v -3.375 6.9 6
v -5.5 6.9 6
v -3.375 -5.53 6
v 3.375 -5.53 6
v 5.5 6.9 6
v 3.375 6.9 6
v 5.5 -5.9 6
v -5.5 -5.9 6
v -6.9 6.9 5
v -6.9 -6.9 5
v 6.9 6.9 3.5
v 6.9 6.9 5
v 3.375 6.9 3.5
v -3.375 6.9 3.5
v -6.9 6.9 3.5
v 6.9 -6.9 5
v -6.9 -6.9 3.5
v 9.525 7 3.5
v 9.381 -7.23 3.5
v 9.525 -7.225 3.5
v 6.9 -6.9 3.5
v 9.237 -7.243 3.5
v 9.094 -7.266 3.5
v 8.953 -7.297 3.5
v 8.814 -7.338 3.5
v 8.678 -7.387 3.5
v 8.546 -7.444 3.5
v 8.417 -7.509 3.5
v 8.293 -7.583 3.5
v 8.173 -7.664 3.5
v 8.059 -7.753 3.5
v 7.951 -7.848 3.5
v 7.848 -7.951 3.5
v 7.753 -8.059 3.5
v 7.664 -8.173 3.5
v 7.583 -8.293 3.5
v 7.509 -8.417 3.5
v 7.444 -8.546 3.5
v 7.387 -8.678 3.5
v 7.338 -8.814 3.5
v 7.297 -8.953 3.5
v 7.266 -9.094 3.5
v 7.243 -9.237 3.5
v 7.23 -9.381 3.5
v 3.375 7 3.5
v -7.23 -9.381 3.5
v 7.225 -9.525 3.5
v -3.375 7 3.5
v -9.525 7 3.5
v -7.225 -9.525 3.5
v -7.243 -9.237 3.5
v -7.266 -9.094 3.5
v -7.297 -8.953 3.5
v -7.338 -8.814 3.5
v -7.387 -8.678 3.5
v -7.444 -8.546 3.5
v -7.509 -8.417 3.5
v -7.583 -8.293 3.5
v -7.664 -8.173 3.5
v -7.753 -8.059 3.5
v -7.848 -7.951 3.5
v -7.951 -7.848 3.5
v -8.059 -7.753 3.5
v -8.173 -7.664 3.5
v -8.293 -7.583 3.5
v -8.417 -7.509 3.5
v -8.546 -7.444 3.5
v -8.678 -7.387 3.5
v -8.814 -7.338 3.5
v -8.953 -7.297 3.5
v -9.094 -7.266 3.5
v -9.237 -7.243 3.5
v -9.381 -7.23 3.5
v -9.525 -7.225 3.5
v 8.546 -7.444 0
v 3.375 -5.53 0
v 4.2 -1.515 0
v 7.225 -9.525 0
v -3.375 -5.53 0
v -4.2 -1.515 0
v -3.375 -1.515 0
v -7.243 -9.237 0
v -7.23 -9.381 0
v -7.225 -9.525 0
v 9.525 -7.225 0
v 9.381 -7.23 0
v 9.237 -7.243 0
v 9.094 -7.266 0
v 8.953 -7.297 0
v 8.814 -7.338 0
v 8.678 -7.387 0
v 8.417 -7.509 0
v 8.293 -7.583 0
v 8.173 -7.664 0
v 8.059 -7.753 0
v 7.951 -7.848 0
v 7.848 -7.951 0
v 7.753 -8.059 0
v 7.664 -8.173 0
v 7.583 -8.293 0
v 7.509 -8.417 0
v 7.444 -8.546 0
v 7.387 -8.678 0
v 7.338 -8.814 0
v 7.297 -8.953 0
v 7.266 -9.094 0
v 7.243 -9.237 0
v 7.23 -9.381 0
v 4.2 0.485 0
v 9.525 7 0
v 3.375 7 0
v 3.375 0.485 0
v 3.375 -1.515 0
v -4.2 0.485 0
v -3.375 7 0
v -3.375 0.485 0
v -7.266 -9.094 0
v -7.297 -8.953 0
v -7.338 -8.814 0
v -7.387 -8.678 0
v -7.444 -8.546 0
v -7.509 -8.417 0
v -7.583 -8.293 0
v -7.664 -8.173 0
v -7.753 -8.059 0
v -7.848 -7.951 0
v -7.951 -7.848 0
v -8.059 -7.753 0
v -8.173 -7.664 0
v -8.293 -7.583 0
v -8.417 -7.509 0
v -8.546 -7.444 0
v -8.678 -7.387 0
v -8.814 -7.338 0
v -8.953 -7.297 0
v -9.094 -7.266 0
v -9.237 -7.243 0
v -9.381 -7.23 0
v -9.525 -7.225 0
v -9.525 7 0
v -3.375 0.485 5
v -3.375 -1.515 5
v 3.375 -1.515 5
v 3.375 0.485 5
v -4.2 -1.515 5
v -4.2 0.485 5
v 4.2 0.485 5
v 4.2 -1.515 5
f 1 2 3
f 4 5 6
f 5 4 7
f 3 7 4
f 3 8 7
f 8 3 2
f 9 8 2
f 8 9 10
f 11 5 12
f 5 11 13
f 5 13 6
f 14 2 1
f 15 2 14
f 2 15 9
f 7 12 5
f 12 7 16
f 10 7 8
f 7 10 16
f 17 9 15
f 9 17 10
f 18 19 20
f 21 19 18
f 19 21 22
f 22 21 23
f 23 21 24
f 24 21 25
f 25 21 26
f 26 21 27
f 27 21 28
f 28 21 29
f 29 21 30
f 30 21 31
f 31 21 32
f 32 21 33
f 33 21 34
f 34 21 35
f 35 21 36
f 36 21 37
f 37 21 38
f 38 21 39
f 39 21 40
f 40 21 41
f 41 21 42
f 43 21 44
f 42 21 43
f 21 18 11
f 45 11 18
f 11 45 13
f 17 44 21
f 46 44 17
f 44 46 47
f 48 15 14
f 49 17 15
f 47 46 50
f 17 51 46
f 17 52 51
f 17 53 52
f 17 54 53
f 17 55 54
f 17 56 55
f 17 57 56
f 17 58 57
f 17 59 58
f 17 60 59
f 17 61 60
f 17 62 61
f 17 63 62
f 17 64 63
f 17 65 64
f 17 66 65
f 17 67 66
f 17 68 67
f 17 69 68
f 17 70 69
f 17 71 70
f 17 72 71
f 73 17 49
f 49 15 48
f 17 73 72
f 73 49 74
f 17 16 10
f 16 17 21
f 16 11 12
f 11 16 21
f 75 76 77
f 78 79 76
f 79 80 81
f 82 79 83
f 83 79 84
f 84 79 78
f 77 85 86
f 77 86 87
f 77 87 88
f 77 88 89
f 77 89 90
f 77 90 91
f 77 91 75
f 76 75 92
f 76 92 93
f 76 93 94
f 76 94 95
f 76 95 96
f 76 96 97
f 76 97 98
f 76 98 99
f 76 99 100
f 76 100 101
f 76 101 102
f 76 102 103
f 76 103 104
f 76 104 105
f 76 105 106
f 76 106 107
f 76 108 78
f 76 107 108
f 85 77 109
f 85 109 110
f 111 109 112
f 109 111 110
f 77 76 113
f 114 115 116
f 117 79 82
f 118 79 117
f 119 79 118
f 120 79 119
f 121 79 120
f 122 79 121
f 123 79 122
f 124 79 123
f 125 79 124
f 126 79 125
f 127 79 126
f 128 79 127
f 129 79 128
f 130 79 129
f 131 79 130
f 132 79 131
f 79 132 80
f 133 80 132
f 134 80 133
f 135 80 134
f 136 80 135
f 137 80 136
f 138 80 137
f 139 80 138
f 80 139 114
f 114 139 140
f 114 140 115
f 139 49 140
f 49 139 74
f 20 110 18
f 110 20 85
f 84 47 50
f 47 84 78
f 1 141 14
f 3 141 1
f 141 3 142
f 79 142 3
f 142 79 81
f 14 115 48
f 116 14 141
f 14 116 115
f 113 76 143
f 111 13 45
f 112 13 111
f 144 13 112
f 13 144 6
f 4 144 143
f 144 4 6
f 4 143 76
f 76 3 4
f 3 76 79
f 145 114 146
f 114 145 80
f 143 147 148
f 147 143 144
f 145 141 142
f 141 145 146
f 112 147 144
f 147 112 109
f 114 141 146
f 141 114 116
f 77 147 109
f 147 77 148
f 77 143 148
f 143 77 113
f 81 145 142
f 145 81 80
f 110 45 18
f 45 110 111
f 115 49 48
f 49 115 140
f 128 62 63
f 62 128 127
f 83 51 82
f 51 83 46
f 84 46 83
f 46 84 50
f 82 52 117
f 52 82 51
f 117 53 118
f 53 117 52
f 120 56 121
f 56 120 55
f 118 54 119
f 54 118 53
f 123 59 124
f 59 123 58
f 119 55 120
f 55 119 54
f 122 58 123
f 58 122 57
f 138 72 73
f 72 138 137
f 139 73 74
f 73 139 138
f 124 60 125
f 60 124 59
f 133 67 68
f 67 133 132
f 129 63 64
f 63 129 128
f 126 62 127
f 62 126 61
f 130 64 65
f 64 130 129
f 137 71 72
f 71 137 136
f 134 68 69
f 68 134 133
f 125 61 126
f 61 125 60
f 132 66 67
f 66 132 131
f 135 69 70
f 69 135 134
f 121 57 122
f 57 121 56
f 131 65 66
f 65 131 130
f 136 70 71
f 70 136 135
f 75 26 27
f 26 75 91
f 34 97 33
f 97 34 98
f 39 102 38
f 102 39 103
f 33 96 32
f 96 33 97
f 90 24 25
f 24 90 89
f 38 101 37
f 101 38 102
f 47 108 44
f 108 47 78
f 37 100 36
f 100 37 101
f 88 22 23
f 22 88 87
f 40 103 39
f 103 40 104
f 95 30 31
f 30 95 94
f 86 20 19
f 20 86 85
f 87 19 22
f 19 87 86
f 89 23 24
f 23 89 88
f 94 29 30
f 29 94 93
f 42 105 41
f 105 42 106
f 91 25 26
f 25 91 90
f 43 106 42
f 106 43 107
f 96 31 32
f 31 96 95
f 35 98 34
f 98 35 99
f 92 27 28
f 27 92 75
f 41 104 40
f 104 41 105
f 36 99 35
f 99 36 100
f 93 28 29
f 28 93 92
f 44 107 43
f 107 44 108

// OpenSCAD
$e = $preview ? 0.1 : 0; $2e = 2*$e;
$fn = $preview ? 32 : 100;

U = 19.05;
H = 14;



stab_holder();




module stab_holder(gap = 3.5, plate = 1.5, extra = 1){
	make_post_cutouts(){
		difference(){
			union(){
				hull(){
					translate([0,0,gap]) 
						linear_extrude(height=plate) square([H-0.2,H-0.2], center=true);
					translate([0,.5,+gap+plate])
						linear_extrude(height=extra) square([11,H-0.2-1], center=true);
				}
				linear_extrude(height=gap) square([U,U], center=true);
			}

			translate([0,0,-$e]){
				linear_extrude(height=gap+plate+extra+$2e)
					translate([-6.75/2, -H/2+(4.7-3.23)])
						square([6.75, 3.23+2.785+6.285+1]);
				linear_extrude(height=gap+plate+$2e)
					translate([-6.75/2-0.825,-H/2+4.7+.785])
							square([6.75+0.825*2, 2]);
			}

			translate([-U/2-$e,H/2,-$e])
				linear_extrude(height=gap+plate+extra+$2e) square([U+$2e,U-H], center=false);
		}
	}

	module make_post_cutouts(){
		difference(){
			children();
			for(i=[-1,+1])
			for(j=[-1,+1])
				translate([i*U/2,j*U/2,-$e]) cylinder(d=4.6, h=gap+$2e);
		}
	}
}
